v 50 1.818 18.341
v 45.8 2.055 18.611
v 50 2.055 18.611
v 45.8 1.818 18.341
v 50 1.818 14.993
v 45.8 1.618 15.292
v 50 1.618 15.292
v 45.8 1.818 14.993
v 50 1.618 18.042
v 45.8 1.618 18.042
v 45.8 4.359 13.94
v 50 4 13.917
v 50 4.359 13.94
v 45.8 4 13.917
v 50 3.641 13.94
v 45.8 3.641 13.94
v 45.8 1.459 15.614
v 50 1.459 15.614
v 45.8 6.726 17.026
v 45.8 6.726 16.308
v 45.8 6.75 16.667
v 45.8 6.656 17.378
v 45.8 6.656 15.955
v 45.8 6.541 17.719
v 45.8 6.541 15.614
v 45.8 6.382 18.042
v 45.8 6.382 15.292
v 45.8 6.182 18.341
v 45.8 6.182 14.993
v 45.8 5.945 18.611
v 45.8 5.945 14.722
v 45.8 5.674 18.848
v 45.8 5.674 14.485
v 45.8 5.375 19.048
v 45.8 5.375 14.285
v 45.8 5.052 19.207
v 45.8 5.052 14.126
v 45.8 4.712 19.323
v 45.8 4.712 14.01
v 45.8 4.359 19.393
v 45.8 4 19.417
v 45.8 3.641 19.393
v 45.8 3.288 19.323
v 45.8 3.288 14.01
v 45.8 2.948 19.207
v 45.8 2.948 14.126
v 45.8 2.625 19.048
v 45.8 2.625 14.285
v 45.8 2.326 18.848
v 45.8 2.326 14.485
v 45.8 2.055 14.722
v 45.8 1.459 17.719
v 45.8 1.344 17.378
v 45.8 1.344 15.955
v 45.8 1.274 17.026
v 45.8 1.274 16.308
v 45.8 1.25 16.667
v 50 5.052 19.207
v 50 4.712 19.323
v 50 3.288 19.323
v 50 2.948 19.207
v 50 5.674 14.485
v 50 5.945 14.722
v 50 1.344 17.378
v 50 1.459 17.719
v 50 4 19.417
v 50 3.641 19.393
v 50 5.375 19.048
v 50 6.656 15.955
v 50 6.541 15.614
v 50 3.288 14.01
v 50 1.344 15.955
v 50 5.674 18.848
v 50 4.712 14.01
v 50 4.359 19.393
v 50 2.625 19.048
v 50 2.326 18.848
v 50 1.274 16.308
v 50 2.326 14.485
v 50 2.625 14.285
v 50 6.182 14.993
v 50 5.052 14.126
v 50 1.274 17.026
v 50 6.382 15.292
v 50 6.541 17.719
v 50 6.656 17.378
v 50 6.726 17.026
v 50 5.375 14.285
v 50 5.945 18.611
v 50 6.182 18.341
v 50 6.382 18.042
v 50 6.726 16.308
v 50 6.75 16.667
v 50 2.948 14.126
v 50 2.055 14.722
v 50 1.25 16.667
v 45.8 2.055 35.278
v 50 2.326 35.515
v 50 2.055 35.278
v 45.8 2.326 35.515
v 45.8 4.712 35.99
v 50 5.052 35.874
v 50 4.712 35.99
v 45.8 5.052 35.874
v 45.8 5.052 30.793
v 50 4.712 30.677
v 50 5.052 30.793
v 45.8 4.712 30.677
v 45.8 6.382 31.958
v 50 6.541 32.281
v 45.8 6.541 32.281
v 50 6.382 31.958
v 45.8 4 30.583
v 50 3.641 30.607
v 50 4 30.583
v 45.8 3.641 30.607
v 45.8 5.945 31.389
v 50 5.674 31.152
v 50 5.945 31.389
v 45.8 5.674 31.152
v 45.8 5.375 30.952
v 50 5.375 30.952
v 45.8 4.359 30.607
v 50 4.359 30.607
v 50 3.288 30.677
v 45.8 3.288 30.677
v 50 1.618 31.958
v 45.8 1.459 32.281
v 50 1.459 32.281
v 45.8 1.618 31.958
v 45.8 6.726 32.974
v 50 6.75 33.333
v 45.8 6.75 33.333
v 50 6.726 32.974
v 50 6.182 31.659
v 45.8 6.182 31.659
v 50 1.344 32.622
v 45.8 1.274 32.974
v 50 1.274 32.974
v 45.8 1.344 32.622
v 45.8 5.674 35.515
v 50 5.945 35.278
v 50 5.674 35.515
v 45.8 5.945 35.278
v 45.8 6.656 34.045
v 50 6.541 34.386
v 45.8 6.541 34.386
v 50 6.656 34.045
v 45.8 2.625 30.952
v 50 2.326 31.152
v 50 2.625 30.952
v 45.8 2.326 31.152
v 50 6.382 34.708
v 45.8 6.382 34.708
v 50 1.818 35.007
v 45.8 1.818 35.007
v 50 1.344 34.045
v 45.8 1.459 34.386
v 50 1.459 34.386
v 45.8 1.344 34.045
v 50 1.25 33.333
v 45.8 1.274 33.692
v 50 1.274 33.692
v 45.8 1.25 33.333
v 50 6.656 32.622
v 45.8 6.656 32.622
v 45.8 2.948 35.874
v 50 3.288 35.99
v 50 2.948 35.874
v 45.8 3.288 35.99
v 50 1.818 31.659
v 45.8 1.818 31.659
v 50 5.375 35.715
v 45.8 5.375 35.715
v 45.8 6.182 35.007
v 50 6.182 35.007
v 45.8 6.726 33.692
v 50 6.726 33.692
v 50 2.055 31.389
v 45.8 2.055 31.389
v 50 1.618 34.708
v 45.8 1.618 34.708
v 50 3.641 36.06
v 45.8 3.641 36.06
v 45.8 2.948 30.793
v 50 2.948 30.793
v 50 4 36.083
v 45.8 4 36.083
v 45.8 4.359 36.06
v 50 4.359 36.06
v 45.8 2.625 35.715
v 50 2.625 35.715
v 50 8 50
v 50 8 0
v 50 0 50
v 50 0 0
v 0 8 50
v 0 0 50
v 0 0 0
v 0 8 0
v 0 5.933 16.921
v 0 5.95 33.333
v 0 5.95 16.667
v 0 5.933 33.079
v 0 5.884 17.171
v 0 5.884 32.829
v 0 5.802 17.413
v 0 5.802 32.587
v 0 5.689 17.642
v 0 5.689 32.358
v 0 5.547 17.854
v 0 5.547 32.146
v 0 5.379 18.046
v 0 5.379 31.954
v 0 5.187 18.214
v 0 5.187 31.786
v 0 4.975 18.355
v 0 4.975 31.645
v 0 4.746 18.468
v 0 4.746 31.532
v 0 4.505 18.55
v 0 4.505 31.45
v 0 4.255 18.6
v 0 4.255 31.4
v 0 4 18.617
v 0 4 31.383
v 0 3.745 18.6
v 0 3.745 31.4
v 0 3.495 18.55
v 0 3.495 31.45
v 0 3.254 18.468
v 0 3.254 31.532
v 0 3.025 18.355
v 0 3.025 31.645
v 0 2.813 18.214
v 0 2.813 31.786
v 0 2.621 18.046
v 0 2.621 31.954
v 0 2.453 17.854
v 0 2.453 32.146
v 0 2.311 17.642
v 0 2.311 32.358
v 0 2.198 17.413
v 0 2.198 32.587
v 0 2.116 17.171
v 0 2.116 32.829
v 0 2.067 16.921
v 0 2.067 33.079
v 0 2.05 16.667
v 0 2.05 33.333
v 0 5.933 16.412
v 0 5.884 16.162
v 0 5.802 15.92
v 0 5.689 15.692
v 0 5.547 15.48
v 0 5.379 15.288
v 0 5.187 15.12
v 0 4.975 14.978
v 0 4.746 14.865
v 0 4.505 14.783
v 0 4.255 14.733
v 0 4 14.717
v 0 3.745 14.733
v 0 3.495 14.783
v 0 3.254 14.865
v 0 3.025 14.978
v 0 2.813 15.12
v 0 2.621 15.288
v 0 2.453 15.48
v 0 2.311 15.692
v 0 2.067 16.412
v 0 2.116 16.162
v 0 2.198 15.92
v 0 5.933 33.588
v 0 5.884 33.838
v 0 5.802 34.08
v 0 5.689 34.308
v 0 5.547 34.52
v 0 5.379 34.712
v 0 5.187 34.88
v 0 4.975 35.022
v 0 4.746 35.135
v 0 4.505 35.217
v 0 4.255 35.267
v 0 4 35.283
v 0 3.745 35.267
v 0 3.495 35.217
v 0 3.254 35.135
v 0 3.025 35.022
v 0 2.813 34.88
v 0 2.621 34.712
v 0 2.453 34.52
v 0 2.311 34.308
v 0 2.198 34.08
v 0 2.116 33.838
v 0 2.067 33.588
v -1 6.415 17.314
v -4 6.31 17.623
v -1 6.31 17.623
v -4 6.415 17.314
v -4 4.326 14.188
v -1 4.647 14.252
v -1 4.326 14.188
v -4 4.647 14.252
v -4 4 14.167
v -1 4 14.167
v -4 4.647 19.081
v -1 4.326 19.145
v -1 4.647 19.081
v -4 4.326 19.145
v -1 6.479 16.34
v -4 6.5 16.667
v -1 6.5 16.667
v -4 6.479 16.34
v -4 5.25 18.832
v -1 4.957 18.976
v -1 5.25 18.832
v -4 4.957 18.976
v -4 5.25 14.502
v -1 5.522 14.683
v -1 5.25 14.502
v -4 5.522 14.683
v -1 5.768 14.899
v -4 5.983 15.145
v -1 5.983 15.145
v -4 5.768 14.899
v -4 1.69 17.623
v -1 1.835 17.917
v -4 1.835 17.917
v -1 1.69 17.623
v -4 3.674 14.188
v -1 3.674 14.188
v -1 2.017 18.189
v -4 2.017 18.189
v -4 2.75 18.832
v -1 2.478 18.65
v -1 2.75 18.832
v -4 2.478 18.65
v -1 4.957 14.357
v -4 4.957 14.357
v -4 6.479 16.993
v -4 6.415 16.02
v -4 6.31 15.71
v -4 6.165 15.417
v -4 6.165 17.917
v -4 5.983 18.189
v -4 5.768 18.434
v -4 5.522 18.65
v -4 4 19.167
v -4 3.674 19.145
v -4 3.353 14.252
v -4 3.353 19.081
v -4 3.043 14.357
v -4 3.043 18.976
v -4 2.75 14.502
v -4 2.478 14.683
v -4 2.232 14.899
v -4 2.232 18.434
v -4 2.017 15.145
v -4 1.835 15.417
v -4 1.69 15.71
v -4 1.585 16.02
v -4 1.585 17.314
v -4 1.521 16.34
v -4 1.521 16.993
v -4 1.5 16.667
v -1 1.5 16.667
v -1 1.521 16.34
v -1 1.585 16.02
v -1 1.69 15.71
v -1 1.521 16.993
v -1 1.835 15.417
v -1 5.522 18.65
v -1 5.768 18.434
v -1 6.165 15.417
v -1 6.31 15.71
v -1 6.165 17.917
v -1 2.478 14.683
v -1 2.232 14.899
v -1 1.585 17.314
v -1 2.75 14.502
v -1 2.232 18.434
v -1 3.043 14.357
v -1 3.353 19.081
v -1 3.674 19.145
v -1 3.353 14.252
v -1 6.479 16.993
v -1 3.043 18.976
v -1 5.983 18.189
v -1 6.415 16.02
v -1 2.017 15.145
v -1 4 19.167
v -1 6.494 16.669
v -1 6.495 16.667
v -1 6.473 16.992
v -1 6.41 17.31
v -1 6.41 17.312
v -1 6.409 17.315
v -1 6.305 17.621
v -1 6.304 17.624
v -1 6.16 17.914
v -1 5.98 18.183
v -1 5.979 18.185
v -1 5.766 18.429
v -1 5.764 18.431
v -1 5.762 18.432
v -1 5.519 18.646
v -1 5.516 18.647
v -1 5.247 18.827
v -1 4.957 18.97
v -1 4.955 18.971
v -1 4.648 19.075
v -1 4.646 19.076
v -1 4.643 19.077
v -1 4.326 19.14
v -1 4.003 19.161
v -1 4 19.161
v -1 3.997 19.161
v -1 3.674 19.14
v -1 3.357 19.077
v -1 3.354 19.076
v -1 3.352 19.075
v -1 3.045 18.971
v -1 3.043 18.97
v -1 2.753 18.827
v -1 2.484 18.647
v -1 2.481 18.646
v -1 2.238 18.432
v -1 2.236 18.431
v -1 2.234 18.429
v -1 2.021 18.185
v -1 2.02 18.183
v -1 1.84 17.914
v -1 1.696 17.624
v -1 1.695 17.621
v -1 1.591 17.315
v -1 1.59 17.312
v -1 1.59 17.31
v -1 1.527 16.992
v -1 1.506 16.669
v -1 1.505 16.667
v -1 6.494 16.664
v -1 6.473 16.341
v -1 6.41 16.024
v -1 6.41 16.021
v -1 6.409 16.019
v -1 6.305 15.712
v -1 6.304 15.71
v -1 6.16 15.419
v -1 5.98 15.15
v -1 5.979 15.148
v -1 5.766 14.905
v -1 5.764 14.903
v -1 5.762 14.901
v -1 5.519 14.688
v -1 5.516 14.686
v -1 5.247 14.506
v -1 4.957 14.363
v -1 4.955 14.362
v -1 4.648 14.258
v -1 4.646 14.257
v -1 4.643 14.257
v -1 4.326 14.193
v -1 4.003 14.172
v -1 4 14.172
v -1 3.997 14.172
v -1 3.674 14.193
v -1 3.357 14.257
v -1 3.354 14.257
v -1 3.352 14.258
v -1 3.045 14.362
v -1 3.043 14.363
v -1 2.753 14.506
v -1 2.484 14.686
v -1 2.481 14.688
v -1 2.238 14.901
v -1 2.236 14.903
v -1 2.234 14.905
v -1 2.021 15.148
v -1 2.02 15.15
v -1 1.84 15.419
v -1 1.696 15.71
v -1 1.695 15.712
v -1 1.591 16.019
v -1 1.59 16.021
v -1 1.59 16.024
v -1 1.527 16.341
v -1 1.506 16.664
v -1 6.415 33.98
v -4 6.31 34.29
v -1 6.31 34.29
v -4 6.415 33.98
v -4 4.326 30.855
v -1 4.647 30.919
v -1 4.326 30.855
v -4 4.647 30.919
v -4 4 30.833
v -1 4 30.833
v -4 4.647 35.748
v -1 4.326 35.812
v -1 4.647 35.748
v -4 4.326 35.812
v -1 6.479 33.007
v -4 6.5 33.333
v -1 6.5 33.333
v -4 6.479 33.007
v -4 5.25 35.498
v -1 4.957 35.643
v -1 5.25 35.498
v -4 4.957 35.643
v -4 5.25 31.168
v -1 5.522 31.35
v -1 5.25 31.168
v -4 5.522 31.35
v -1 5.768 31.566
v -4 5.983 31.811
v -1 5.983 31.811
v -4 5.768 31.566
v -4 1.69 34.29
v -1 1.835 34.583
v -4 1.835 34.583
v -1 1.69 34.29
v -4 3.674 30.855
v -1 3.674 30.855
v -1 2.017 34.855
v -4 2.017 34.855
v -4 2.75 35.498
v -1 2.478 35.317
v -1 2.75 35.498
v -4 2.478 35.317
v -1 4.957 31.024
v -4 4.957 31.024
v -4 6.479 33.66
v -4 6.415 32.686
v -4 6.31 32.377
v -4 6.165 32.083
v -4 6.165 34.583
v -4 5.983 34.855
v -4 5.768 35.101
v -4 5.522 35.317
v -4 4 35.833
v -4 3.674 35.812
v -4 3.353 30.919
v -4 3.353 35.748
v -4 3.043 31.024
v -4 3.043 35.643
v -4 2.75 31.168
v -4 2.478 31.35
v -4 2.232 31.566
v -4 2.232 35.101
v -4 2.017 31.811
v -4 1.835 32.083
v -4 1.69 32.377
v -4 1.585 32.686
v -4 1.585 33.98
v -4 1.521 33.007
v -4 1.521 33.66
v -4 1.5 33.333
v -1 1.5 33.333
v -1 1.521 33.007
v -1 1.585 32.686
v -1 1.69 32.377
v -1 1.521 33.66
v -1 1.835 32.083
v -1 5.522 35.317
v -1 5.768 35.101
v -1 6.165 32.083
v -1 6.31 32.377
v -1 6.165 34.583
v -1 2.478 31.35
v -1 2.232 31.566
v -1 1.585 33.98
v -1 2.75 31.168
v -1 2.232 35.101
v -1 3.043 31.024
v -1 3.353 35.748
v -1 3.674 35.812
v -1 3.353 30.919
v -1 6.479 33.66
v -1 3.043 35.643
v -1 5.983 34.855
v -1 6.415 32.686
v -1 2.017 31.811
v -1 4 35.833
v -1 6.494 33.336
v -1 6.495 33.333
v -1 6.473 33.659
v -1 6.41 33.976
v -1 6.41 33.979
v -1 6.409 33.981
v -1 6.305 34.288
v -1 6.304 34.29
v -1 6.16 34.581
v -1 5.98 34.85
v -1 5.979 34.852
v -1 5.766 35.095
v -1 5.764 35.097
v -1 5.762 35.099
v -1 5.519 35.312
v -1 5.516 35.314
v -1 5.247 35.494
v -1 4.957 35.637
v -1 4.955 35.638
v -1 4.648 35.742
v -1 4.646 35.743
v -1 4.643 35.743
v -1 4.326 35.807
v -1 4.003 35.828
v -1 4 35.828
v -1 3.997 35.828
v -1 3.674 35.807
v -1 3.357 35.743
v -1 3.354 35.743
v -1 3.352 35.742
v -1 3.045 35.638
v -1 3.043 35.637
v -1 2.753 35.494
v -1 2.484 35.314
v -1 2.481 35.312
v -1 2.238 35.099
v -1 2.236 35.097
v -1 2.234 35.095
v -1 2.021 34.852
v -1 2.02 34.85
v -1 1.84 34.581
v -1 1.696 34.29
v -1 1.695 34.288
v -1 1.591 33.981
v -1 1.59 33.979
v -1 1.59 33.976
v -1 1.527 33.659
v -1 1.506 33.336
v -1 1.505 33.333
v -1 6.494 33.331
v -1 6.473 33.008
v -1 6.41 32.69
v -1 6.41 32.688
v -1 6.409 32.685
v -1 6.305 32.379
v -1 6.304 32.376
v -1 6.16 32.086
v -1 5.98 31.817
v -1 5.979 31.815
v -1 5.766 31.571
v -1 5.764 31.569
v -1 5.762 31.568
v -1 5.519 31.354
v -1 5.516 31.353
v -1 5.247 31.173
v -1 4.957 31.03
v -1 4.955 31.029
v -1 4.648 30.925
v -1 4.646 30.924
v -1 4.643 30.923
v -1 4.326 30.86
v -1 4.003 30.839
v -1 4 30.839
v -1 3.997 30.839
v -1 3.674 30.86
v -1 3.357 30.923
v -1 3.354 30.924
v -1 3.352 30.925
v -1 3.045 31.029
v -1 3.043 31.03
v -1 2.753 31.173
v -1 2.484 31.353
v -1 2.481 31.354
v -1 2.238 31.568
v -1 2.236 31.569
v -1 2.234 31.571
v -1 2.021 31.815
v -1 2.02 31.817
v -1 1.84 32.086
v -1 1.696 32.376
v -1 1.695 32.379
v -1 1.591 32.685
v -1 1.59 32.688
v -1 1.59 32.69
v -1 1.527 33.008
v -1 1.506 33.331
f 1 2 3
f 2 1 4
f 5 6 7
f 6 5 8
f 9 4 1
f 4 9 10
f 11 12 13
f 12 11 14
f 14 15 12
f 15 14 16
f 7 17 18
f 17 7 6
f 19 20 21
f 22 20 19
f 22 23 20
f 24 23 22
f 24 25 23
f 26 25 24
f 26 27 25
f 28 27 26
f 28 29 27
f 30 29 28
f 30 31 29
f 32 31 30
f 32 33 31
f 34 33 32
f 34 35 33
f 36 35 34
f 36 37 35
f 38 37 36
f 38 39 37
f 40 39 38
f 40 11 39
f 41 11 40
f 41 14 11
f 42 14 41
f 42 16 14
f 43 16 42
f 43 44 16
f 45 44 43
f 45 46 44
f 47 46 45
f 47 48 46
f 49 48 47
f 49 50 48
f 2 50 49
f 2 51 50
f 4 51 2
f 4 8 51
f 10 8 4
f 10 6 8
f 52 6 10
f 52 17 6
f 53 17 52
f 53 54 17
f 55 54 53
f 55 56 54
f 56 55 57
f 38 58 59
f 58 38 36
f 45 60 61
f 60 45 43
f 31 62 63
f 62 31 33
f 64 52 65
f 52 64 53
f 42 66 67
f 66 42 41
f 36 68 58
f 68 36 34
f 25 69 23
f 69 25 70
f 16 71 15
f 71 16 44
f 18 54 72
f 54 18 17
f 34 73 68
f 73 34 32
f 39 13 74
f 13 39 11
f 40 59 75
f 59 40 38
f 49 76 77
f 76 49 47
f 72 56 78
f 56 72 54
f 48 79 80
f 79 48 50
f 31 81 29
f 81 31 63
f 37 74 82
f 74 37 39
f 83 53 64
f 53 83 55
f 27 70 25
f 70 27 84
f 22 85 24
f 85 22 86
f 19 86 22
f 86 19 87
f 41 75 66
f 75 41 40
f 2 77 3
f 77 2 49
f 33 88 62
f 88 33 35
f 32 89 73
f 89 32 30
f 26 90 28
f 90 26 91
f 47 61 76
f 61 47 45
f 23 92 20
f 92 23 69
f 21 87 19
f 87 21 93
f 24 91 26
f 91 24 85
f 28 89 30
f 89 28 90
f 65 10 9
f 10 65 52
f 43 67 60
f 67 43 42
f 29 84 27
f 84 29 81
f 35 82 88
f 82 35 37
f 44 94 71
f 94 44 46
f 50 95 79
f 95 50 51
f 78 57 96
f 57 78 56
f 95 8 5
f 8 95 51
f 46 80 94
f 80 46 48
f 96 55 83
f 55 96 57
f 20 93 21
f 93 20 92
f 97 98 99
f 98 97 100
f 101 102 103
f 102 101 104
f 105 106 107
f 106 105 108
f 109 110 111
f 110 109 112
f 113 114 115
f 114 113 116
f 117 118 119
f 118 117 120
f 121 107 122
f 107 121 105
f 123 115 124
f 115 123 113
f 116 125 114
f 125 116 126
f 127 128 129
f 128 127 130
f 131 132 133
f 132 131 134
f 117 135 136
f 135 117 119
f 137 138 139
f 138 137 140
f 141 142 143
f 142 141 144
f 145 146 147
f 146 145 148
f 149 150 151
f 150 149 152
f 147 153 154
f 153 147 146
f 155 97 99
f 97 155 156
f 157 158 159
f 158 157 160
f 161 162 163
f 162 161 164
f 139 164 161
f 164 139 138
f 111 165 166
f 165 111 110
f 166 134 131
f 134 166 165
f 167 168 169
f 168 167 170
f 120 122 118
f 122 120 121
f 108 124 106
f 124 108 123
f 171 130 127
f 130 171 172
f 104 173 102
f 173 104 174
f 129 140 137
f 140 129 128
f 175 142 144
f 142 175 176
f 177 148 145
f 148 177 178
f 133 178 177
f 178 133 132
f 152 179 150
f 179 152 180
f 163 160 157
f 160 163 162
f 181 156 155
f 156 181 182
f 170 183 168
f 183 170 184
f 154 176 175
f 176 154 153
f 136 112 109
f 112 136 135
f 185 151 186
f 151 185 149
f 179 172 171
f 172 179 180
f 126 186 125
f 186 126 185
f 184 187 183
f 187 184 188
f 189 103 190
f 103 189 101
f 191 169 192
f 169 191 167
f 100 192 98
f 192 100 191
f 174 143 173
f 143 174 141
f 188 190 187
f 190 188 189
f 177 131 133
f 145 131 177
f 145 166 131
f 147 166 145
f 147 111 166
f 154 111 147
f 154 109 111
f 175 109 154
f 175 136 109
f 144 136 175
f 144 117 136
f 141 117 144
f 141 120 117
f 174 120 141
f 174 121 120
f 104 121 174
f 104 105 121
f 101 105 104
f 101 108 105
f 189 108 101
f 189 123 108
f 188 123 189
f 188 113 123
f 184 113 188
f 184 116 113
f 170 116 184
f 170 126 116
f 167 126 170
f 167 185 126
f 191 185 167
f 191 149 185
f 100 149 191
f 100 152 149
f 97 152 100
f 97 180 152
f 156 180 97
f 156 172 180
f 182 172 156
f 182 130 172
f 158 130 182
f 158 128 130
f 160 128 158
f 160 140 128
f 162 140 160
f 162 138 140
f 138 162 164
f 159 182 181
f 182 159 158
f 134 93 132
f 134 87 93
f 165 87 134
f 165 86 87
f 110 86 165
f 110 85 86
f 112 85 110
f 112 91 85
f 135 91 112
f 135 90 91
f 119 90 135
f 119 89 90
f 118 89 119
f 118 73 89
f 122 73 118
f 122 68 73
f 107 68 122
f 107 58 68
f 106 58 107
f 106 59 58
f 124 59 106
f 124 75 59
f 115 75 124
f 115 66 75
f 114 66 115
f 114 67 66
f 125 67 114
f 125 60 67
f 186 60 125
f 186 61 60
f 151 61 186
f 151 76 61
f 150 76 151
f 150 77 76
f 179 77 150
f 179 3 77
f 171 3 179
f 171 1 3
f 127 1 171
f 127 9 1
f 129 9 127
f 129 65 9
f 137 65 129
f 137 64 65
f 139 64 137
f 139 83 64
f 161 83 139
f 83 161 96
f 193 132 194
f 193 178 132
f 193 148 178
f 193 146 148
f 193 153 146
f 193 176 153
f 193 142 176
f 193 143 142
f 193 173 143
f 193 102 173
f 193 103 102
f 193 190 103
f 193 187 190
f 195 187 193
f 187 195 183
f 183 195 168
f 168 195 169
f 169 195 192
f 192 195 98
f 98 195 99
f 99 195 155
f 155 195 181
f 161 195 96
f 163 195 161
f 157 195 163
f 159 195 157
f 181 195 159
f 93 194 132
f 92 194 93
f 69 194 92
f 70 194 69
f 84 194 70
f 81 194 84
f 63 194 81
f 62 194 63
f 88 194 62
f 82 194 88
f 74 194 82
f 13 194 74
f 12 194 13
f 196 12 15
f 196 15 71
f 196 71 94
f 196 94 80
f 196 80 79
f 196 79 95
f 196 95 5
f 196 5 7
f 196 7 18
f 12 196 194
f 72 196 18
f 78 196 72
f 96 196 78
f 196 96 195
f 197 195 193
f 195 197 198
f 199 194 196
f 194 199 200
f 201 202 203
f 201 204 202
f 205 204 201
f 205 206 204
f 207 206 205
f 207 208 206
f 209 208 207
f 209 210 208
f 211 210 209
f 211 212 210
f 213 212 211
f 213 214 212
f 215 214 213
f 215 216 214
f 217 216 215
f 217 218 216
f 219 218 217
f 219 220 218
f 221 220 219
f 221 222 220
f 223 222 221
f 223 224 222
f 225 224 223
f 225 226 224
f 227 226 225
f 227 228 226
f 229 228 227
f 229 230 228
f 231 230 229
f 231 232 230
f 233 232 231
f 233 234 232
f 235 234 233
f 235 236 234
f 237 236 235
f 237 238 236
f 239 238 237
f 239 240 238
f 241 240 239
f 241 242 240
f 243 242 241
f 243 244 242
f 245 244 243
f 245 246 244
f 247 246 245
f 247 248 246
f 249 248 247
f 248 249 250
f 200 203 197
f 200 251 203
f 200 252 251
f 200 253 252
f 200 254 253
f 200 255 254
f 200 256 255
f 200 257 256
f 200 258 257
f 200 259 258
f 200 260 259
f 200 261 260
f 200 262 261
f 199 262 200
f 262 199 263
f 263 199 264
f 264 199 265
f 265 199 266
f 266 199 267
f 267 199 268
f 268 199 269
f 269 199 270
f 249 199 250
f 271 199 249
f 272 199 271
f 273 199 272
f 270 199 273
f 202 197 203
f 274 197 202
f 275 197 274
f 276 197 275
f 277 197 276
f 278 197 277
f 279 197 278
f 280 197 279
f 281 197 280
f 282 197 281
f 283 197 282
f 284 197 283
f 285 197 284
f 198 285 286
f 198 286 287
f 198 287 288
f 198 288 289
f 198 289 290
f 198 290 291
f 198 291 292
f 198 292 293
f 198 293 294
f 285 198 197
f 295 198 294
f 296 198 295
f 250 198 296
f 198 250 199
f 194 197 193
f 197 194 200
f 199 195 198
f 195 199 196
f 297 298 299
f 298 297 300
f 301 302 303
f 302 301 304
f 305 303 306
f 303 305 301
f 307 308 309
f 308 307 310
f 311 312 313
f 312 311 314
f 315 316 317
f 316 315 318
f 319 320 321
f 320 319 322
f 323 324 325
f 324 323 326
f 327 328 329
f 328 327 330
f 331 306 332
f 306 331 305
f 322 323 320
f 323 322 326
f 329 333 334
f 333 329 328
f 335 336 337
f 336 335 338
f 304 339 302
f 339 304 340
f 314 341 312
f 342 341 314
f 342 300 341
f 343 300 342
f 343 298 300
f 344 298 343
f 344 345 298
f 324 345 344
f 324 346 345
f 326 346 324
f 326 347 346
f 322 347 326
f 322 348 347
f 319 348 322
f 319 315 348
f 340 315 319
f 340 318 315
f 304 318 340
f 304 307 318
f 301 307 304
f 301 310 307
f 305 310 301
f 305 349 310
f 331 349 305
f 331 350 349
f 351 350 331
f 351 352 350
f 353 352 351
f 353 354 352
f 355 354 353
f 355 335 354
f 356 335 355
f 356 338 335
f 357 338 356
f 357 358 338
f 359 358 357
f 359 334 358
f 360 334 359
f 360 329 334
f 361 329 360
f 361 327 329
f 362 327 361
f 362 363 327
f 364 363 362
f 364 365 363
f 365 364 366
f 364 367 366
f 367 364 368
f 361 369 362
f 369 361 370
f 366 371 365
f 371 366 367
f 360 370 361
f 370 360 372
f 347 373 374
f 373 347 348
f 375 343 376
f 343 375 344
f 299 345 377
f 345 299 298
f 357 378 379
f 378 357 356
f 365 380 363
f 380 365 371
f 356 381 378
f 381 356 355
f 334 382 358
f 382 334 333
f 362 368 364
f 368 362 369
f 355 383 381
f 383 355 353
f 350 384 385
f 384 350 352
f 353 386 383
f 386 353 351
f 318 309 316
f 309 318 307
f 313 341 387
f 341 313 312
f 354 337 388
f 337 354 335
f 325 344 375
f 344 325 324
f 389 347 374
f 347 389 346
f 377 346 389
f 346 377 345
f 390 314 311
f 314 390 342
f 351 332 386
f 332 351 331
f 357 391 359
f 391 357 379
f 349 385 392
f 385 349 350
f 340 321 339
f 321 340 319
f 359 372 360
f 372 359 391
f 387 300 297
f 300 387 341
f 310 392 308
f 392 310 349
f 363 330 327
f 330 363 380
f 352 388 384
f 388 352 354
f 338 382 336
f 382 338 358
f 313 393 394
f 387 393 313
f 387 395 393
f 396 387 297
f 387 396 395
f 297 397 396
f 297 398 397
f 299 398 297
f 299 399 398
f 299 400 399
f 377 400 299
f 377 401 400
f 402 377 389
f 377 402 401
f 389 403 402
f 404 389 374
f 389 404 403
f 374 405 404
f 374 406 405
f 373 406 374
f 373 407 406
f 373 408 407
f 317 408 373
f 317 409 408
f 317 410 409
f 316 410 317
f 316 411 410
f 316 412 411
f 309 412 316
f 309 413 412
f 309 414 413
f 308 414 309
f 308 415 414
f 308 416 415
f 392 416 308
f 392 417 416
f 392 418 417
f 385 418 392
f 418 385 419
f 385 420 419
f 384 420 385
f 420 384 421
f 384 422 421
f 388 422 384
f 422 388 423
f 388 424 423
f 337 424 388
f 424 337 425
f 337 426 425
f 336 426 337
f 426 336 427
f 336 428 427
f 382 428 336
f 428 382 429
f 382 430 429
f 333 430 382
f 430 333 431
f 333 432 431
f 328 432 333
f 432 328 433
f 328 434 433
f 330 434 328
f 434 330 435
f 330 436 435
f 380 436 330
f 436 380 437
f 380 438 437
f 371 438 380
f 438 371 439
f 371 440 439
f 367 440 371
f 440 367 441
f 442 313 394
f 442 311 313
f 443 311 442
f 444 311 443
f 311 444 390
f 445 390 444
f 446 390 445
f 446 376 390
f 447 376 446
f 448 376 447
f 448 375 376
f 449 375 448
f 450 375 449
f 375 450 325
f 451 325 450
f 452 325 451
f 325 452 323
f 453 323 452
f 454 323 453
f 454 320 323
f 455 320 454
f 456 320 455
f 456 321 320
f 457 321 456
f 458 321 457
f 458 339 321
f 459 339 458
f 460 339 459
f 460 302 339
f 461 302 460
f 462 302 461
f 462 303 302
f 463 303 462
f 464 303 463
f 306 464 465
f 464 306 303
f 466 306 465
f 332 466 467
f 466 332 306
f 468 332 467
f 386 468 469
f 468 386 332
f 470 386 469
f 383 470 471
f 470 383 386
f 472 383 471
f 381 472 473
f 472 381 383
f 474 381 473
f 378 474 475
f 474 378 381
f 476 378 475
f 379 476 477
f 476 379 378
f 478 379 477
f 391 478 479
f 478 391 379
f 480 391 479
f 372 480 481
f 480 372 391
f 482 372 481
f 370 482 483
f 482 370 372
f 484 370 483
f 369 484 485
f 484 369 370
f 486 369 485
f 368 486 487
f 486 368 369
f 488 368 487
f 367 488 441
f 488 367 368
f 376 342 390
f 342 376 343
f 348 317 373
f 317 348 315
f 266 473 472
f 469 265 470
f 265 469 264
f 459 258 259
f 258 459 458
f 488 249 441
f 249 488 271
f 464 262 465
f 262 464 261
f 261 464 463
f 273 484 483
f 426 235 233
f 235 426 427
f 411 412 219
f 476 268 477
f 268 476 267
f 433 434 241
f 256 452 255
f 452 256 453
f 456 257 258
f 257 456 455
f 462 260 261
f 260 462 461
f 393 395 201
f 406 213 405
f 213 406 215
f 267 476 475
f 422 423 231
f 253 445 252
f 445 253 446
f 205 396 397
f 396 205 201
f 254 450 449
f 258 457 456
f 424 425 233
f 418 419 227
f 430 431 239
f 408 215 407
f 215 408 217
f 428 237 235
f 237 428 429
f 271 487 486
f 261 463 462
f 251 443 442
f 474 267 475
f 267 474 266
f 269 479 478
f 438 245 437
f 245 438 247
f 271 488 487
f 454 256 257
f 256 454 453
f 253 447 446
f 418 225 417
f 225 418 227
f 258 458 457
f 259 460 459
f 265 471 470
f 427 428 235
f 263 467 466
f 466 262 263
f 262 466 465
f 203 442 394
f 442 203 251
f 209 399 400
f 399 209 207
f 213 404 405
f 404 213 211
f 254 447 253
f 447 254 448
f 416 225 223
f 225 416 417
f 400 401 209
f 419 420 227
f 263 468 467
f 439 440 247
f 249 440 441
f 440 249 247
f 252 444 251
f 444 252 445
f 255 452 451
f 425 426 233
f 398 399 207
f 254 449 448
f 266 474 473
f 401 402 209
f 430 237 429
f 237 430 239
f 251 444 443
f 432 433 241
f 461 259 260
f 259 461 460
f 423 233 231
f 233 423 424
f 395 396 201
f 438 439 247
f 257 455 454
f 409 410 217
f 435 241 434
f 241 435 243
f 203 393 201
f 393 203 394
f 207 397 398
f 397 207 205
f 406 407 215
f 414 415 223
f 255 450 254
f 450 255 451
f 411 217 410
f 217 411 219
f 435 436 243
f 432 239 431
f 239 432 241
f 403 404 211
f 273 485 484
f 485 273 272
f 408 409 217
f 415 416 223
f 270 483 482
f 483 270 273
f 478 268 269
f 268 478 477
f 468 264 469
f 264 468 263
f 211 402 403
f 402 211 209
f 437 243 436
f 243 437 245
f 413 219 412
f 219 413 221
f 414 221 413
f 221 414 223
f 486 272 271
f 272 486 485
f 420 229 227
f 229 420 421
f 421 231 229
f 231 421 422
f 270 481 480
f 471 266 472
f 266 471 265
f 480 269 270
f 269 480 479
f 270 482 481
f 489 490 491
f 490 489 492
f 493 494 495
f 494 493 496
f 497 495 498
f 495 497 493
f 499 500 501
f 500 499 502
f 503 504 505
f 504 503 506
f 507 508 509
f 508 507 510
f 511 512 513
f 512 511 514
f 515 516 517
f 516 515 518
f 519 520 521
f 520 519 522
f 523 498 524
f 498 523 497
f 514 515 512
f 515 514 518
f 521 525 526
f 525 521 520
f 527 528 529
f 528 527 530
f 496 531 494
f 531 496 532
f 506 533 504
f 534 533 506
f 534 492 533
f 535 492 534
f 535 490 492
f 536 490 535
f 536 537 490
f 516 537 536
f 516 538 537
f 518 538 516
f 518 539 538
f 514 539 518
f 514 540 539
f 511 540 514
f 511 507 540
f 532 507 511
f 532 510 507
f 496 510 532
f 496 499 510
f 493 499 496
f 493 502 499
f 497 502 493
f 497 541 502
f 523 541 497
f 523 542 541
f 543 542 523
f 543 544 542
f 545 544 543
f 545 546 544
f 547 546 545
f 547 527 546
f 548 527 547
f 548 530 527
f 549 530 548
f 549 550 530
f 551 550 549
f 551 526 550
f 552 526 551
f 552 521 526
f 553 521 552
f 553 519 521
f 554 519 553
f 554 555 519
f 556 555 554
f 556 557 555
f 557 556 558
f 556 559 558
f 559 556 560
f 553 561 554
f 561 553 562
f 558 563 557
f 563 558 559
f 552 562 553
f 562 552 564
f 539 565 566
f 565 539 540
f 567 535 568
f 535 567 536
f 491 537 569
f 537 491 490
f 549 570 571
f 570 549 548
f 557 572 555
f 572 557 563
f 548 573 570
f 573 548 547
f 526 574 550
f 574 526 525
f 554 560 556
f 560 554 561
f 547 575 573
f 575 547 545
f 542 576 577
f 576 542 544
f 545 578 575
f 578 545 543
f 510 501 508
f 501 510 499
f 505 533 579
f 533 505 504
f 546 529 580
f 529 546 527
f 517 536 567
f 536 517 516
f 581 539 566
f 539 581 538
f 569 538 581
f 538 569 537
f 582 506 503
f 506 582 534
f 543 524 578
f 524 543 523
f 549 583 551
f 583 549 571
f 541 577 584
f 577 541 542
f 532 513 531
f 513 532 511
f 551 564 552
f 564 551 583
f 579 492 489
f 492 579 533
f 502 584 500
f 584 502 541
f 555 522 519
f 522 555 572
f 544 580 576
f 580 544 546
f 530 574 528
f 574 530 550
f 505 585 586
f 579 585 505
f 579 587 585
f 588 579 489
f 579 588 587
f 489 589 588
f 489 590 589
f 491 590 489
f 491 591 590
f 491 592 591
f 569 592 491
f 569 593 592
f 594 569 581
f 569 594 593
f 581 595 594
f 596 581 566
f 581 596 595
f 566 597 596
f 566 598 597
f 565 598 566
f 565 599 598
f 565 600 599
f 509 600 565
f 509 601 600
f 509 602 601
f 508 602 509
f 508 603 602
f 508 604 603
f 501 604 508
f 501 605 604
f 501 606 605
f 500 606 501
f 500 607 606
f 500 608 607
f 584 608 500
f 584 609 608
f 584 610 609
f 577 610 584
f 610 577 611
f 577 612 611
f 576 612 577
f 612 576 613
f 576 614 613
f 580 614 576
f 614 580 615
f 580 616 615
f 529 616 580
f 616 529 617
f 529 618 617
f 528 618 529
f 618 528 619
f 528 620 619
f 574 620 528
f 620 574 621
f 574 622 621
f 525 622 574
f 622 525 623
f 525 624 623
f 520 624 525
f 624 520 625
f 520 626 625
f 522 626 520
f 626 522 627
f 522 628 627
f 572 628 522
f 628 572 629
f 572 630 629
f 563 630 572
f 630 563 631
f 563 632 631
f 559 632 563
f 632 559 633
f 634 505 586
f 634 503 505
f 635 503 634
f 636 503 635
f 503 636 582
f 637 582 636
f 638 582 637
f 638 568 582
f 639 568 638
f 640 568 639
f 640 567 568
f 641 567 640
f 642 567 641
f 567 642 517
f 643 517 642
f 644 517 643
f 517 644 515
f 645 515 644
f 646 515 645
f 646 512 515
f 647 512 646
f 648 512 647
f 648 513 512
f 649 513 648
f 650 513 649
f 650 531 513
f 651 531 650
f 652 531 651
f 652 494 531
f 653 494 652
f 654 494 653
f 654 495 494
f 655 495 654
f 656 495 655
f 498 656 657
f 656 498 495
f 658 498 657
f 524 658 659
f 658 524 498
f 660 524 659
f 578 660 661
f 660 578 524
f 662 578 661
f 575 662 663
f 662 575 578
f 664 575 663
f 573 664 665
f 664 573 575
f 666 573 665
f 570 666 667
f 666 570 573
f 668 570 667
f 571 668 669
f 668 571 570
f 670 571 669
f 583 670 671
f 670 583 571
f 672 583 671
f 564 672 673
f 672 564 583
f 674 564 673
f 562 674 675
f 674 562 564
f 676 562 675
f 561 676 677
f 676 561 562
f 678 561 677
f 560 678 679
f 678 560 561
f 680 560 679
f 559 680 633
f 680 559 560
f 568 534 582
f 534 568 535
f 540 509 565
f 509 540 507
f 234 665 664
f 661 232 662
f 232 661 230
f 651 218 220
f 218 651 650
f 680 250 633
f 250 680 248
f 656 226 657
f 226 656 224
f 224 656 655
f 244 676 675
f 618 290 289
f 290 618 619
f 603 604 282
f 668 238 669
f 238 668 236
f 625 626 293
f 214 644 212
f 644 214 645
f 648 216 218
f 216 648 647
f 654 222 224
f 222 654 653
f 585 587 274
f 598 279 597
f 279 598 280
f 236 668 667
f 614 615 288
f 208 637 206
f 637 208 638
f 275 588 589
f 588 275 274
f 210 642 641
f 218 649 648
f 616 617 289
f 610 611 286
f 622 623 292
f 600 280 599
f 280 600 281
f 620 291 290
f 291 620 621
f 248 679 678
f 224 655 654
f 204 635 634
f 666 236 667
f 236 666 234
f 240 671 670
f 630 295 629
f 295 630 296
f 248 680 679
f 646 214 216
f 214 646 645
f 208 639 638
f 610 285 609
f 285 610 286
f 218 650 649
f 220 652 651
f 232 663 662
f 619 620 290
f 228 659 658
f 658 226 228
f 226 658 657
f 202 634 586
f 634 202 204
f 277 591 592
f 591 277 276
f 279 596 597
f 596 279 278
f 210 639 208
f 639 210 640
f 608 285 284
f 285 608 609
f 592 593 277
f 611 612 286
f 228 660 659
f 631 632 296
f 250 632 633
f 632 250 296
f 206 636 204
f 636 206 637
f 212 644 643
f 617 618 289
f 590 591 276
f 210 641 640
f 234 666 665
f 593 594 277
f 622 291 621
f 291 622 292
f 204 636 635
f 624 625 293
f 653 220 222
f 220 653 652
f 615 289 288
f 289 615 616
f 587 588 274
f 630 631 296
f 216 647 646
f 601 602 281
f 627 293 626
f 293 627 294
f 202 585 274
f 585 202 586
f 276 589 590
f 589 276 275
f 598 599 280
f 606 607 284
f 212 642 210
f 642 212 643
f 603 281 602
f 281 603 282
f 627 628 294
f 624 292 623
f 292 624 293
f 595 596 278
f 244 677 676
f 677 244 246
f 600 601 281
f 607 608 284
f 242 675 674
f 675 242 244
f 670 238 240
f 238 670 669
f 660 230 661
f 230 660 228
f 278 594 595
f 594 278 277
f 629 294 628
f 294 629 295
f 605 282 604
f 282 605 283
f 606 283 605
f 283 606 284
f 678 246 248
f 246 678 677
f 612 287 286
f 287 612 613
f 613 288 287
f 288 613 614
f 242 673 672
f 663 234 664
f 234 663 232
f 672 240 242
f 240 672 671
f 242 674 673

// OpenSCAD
// ==========================================
// PAREDE 50x50 E QUINA 90° - CASINHA MODULAR
// ==========================================

lado_parede    = 50;     // 50 x 50 mm
espessura      = 8;      // Espessura firme

// Tipo de peça: "parede" ou "quina"
tipo_peca      = "parede";

// Parâmetros do encaixe
raio_pino      = 2.5;
altura_pino    = 4.0;
folga_encaixe  = 0.25;   // Ajuste fino para sua Ender 3 + PLA
qtd_pinos      = 2;

$fn = 48;

module pino_com_ponta(r, h) {
    // Corpo principal (75%)
    cylinder(h = h * 0.75, r = r);
    // Ponta chanfrada (25%) para facilitar o encaixe das crianças
    translate([0, 0, h * 0.75 - 0.01])
        cylinder(h = h * 0.25 + 0.01, r1 = r, r2 = r * 0.78);
}

module parede_50x50() {
    difference() {
        cube([lado_parede, espessura, lado_parede]);

        // Furos na face direita (X = lado_parede)
        for (i = [1 : qtd_pinos]) {
            z_pos = (lado_parede / (qtd_pinos + 1)) * i;
            translate([
                lado_parede - (altura_pino + folga_encaixe) + 0.05,
                espessura / 2,
                z_pos
            ])
            rotate([0, 90, 0])
                cylinder(
                    h = altura_pino + folga_encaixe + 0.1,
                    r = raio_pino + folga_encaixe
                );
        }
    }

    // Pinos na face esquerda (X = 0)
    for (i = [1 : qtd_pinos]) {
        z_pos = (lado_parede / (qtd_pinos + 1)) * i;
        translate([-altura_pino, espessura / 2, z_pos])
        rotate([0, 90, 0])
            pino_com_ponta(raio_pino, altura_pino);
    }
}

module quina_90_graus() {
    // Pilar/quina de 50 mm de altura com encaixes em +X e +Y
    difference() {
        cube([espessura, espessura, lado_parede]);

        // Furos na face +X (encaixa parede vindo pela direita)
        for (i = [1 : qtd_pinos]) {
            z_pos = (lado_parede / (qtd_pinos + 1)) * i;
            translate([
                espessura - (altura_pino + folga_encaixe) + 0.05,
                espessura / 2,
                z_pos
            ])
            rotate([0, 90, 0])
                cylinder(
                    h = altura_pino + folga_encaixe + 0.1,
                    r = raio_pino + folga_encaixe
                );
        }

        // Furos na face +Y (encaixa parede vindo pela frente/trás)
        for (i = [1 : qtd_pinos]) {
            z_pos = (lado_parede / (qtd_pinos + 1)) * i;
            translate([
                espessura / 2,
                espessura - (altura_pino + folga_encaixe) + 0.05,
                z_pos
            ])
            rotate([-90, 0, 0])
                cylinder(
                    h = altura_pino + folga_encaixe + 0.1,
                    r = raio_pino + folga_encaixe
                );
        }
    }
}

if (tipo_peca == "quina") {
    quina_90_graus();
} else {
    parede_50x50();
}
